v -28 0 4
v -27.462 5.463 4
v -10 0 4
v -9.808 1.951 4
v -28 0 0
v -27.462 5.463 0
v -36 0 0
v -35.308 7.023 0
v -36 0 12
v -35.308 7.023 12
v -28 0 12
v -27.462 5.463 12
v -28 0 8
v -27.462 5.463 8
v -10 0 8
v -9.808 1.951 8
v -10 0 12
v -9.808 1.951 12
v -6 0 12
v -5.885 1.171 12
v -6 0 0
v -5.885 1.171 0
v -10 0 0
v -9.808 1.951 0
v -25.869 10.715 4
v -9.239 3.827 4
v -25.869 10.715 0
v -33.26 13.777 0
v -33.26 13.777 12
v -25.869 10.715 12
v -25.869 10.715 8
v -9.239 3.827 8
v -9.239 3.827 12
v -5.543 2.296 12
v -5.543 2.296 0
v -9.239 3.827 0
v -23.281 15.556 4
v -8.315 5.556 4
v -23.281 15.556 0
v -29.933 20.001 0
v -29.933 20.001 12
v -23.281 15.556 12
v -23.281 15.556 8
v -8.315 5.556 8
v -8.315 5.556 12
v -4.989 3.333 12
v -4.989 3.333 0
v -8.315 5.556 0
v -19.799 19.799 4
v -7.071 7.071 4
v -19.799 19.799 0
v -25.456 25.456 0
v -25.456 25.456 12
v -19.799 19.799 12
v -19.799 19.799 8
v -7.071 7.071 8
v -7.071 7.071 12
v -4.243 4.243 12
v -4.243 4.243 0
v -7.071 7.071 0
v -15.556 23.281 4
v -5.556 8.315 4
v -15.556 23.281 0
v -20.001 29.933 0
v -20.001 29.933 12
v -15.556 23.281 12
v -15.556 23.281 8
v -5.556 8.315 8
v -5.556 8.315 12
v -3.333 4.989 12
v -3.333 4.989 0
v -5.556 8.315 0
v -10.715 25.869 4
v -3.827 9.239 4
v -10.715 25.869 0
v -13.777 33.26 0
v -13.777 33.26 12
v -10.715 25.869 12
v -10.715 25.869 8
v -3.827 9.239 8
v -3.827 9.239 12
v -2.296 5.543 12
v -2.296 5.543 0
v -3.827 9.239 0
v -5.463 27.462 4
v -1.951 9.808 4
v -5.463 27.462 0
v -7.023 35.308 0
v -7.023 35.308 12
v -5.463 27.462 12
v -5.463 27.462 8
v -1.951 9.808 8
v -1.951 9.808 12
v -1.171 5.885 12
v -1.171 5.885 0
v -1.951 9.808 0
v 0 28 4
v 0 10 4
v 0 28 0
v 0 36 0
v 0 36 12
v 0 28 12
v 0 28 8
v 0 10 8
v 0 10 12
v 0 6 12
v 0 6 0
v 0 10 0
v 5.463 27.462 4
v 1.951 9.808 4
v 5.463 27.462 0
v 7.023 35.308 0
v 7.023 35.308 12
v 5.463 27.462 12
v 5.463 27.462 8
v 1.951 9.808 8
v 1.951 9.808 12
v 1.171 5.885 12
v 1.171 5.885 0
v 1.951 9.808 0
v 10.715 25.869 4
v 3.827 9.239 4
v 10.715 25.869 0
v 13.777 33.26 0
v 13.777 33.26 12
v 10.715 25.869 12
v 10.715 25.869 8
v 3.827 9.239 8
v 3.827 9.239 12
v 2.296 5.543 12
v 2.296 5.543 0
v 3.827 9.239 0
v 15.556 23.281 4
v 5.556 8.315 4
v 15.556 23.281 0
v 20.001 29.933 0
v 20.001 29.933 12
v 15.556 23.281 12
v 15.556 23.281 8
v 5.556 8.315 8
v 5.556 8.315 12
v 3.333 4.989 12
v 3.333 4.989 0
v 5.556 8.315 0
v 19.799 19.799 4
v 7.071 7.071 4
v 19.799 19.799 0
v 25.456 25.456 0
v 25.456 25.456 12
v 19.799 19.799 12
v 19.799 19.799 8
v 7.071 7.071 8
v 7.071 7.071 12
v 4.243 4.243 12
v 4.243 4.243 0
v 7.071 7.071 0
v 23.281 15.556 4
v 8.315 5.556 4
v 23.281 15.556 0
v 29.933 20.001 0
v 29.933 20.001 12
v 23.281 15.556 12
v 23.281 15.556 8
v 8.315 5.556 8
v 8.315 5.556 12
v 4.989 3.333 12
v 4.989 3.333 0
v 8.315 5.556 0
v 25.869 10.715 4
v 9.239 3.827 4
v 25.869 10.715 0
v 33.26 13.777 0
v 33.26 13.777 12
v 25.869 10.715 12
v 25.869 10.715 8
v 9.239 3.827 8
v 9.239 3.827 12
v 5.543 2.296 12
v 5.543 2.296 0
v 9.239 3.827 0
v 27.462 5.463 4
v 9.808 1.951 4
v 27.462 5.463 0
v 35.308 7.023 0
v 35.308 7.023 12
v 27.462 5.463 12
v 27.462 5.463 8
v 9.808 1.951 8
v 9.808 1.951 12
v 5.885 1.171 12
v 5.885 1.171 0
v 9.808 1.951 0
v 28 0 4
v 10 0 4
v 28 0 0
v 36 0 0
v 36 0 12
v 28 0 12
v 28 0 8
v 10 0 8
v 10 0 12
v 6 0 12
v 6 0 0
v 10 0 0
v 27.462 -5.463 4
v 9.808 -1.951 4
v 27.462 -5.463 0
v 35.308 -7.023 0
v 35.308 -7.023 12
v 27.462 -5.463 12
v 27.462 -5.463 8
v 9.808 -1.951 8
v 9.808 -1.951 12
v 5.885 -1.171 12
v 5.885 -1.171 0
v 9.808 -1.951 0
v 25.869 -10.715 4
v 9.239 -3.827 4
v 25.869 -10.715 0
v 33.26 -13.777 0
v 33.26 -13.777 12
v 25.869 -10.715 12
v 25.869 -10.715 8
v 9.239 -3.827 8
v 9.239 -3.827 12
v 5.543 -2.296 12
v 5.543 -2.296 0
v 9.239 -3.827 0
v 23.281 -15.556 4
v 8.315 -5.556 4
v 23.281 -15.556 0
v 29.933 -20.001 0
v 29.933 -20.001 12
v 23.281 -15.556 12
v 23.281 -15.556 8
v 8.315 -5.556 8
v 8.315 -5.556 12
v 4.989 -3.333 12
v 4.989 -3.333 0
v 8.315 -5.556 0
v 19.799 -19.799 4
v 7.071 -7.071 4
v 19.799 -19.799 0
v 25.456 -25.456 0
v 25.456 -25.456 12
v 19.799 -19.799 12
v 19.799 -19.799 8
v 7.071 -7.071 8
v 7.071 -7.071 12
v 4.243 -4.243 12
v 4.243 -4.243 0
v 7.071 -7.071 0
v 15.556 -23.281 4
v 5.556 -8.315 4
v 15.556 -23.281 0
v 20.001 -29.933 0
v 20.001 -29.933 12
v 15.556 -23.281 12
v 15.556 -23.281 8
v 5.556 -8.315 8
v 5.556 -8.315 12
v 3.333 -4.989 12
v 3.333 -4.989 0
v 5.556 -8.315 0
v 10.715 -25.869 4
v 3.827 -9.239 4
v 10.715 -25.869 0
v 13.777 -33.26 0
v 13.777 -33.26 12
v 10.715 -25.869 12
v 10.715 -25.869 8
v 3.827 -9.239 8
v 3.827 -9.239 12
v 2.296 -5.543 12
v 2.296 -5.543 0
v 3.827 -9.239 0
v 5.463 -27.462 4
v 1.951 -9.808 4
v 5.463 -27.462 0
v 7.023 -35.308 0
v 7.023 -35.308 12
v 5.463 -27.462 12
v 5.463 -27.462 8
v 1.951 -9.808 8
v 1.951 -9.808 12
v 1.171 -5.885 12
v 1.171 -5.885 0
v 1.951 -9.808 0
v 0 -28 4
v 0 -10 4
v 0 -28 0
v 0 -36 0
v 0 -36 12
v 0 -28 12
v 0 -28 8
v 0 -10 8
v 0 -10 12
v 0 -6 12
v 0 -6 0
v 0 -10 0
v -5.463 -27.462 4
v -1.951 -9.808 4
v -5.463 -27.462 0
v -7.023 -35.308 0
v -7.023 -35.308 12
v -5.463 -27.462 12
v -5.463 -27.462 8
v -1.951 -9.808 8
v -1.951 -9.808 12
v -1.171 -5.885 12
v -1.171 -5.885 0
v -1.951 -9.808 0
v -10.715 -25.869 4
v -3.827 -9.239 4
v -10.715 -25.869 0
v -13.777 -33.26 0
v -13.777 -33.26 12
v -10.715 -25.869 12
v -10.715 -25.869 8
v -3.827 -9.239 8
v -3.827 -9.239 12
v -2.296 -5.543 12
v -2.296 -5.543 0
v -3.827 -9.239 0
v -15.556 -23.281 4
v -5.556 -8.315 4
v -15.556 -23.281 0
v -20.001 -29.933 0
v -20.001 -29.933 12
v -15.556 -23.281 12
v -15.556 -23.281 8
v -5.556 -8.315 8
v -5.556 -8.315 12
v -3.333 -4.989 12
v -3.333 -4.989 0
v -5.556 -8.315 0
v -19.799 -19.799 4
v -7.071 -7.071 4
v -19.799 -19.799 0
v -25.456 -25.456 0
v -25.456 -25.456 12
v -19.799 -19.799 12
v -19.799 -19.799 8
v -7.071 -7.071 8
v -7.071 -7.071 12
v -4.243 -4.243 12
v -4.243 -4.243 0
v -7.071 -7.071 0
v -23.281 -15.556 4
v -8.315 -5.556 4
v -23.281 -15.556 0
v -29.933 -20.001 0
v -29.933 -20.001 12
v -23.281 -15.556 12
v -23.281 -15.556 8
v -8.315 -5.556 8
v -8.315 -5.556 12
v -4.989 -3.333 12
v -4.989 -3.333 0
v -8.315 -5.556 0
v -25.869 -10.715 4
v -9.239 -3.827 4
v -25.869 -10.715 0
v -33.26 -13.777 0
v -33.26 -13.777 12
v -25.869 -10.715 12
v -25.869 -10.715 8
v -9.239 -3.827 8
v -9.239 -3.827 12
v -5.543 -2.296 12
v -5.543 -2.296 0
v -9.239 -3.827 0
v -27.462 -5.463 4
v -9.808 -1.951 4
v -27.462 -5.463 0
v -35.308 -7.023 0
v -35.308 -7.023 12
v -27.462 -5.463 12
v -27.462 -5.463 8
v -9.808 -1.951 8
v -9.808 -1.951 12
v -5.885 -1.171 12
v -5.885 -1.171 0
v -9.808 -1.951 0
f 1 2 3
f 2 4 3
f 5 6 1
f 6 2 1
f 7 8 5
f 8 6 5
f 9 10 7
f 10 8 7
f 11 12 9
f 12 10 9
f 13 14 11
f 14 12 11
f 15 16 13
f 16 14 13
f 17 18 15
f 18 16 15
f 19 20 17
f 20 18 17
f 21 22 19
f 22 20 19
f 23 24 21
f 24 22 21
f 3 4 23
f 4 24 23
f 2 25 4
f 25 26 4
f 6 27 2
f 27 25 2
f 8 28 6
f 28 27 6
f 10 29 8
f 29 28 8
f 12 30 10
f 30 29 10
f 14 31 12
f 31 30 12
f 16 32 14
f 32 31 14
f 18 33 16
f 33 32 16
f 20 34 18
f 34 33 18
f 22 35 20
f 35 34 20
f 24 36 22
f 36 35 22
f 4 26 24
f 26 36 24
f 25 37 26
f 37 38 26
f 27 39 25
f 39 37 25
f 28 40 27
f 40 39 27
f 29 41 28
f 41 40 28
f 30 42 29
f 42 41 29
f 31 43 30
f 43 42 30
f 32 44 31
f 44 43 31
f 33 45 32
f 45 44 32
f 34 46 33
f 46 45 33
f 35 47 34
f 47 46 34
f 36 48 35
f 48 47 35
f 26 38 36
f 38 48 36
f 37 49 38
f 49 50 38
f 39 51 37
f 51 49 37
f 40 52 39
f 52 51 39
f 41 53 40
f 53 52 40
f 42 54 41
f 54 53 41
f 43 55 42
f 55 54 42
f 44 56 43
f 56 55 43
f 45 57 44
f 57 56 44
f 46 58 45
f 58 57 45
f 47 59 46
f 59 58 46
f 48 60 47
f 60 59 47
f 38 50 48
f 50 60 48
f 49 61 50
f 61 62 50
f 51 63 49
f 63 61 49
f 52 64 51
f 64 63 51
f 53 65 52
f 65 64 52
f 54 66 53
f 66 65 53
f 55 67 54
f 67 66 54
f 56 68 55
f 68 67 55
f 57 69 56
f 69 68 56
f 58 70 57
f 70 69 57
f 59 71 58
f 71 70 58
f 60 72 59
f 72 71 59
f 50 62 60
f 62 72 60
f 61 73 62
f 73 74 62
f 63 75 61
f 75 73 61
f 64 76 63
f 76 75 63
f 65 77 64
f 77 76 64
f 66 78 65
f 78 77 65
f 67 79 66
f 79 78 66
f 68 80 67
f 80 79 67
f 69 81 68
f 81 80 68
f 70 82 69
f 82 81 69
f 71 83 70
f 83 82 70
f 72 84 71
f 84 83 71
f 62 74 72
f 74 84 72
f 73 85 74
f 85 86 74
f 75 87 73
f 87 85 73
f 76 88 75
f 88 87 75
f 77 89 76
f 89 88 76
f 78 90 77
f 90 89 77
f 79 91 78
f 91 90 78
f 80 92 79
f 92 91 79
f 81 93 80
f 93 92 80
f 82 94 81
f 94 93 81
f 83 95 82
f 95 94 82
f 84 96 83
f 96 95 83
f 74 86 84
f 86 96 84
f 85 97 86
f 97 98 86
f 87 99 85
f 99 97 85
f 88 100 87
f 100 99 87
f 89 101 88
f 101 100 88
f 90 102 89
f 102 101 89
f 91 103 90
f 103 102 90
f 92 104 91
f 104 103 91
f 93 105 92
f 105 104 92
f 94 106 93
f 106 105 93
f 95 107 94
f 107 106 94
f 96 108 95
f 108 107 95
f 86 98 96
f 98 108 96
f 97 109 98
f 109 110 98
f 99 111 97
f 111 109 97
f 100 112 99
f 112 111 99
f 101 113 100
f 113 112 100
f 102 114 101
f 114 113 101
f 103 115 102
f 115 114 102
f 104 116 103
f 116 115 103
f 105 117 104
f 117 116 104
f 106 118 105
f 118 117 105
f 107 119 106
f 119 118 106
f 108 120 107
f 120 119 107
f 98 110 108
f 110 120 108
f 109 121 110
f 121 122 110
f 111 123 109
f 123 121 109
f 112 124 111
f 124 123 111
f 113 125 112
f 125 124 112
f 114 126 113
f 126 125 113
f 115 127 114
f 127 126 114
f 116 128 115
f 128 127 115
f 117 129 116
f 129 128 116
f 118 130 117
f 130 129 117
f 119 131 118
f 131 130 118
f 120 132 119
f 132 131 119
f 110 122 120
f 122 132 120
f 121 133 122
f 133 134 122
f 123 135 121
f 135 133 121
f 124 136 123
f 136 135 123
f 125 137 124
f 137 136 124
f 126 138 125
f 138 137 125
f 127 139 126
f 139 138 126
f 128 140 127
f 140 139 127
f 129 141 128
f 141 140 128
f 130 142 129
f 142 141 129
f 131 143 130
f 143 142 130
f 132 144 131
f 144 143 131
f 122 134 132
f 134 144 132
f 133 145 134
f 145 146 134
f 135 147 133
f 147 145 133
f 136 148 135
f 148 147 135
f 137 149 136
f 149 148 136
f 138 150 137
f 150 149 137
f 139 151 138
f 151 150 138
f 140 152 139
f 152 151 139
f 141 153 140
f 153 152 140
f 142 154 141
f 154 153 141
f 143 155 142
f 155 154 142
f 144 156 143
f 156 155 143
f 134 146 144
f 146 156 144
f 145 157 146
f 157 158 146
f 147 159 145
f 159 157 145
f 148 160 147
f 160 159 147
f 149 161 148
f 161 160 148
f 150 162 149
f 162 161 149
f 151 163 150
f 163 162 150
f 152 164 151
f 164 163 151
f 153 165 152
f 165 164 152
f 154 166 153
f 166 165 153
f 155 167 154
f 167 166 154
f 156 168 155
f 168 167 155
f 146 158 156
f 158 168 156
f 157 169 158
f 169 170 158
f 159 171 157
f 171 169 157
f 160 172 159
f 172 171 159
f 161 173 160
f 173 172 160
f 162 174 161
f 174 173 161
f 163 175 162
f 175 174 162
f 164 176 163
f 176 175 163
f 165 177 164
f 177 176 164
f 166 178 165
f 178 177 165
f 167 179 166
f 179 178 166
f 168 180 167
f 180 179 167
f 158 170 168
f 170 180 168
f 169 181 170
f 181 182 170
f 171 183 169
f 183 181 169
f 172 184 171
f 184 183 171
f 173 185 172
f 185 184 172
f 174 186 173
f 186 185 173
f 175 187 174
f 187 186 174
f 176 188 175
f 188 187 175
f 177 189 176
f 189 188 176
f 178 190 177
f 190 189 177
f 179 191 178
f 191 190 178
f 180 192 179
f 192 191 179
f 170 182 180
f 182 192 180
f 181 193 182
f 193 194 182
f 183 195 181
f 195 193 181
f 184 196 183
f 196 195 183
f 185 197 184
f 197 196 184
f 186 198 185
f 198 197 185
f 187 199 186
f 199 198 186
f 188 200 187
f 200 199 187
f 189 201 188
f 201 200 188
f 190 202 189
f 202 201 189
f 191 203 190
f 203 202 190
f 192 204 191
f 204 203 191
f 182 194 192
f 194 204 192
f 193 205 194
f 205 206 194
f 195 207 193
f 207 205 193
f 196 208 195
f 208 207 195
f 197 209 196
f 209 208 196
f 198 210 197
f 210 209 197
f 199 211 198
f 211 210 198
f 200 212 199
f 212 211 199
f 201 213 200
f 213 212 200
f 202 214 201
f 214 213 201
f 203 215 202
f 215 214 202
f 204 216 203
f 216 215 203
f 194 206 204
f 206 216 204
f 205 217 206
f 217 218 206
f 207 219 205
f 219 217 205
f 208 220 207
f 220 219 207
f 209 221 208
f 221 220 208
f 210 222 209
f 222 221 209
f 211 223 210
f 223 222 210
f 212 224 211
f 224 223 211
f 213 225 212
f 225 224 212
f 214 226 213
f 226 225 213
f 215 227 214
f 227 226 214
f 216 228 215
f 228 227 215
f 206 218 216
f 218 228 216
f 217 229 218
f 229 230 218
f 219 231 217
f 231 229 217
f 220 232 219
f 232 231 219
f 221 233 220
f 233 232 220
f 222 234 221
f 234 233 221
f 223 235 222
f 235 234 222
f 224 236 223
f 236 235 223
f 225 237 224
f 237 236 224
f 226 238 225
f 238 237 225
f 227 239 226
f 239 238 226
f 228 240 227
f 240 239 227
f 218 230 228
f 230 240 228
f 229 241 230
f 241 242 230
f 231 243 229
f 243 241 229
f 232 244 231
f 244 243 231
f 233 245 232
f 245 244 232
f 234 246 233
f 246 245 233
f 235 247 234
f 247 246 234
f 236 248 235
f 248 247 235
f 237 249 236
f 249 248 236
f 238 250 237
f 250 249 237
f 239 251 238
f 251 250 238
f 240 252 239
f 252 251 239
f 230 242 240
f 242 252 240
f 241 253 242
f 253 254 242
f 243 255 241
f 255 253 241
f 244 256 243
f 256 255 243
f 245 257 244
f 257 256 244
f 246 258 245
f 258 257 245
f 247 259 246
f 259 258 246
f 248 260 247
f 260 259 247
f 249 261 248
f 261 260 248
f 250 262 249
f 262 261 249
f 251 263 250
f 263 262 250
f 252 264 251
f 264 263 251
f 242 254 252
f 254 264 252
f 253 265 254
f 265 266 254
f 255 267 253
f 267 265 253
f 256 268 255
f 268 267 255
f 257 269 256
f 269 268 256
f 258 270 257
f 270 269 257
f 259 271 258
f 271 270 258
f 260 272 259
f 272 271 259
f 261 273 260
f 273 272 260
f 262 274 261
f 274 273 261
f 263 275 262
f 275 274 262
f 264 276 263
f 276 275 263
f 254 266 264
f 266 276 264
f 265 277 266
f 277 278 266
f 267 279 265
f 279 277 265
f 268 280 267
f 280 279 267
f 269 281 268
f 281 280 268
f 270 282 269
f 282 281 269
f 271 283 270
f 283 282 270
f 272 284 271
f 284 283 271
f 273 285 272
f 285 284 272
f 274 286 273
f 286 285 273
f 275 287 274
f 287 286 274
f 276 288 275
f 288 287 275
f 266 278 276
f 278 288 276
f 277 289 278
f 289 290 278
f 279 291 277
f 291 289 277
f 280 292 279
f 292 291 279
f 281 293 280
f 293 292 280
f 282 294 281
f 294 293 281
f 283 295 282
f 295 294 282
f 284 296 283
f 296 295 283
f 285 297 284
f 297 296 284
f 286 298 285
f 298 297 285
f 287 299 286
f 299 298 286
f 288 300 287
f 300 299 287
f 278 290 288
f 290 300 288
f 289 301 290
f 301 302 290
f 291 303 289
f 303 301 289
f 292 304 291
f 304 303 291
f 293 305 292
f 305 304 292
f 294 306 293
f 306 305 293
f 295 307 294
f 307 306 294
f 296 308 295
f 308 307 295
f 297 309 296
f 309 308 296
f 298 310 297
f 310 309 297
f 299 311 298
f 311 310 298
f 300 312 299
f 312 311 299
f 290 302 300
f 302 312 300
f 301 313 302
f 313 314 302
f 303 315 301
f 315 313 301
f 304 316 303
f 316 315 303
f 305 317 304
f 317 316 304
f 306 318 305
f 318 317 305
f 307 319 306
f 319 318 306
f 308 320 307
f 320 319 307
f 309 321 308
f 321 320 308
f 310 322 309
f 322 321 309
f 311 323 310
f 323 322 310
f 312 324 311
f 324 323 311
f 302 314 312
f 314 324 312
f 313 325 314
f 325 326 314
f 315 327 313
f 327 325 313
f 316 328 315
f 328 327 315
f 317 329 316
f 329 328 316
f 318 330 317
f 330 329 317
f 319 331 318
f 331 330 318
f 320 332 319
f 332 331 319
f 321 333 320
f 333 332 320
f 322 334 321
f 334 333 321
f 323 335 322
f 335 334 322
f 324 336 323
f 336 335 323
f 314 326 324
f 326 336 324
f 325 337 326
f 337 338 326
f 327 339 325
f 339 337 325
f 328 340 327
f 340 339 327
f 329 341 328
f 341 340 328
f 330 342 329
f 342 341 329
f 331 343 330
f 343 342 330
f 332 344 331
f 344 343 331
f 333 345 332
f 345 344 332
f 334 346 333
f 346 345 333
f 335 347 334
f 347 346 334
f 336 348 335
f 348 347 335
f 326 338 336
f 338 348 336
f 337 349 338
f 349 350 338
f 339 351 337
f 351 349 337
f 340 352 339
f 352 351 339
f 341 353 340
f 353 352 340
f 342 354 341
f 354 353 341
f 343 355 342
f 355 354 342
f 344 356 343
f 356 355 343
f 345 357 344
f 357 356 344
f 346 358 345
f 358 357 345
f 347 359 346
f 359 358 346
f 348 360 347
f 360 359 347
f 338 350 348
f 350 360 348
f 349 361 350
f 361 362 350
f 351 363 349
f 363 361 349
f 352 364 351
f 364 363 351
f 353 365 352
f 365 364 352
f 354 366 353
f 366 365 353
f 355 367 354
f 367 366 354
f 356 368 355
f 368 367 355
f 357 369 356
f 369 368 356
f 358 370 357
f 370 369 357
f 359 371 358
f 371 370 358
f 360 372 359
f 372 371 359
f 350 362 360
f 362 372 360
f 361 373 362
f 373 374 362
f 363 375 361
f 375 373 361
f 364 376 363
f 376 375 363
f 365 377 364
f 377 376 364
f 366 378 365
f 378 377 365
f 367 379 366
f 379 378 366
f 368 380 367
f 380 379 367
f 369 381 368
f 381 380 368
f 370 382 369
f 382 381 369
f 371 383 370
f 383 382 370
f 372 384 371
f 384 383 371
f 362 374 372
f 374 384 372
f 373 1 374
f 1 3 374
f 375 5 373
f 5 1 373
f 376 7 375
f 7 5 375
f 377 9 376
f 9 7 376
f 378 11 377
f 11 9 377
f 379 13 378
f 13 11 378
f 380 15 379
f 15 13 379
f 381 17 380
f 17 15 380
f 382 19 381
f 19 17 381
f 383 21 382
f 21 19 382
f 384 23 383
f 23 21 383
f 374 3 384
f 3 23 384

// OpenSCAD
$fn = 32;

// ----------------------------------------------------------------------
// Revolved part: handwheel R36
// ----------------------------------------------------------------------

// --- parameters (mm) ---
bore_r = 6;               // bore radius
rim_r = 36;               // rim radius
rim_w = 8;                // rim axial width
rim_t = 12;               // rim diameter height
hub_r = 10;               // hub radius
web_t = 4;                // web thickness
revolve_angle = 360;      // revolve sweep, degrees
fit_tol = 0.05;           // declared fit tolerance (prompt contract)
free_tol = 0.2;           // declared free tolerance (prompt contract)

bore_d = 2 * bore_r;
rim_d = 2 * rim_r;
hub_d = 2 * hub_r;

profile = [[6, 0], [10, 0], [10, 4], [28, 4], [28, 0], [36, 0], [36, 12], [28, 12], [28, 8], [10, 8], [10, 12], [6, 12]];  // primary outline, 12 points, counter clockwise

// --- the one profile operation ---
rotate_extrude(angle = revolve_angle) polygon(points = profile);
